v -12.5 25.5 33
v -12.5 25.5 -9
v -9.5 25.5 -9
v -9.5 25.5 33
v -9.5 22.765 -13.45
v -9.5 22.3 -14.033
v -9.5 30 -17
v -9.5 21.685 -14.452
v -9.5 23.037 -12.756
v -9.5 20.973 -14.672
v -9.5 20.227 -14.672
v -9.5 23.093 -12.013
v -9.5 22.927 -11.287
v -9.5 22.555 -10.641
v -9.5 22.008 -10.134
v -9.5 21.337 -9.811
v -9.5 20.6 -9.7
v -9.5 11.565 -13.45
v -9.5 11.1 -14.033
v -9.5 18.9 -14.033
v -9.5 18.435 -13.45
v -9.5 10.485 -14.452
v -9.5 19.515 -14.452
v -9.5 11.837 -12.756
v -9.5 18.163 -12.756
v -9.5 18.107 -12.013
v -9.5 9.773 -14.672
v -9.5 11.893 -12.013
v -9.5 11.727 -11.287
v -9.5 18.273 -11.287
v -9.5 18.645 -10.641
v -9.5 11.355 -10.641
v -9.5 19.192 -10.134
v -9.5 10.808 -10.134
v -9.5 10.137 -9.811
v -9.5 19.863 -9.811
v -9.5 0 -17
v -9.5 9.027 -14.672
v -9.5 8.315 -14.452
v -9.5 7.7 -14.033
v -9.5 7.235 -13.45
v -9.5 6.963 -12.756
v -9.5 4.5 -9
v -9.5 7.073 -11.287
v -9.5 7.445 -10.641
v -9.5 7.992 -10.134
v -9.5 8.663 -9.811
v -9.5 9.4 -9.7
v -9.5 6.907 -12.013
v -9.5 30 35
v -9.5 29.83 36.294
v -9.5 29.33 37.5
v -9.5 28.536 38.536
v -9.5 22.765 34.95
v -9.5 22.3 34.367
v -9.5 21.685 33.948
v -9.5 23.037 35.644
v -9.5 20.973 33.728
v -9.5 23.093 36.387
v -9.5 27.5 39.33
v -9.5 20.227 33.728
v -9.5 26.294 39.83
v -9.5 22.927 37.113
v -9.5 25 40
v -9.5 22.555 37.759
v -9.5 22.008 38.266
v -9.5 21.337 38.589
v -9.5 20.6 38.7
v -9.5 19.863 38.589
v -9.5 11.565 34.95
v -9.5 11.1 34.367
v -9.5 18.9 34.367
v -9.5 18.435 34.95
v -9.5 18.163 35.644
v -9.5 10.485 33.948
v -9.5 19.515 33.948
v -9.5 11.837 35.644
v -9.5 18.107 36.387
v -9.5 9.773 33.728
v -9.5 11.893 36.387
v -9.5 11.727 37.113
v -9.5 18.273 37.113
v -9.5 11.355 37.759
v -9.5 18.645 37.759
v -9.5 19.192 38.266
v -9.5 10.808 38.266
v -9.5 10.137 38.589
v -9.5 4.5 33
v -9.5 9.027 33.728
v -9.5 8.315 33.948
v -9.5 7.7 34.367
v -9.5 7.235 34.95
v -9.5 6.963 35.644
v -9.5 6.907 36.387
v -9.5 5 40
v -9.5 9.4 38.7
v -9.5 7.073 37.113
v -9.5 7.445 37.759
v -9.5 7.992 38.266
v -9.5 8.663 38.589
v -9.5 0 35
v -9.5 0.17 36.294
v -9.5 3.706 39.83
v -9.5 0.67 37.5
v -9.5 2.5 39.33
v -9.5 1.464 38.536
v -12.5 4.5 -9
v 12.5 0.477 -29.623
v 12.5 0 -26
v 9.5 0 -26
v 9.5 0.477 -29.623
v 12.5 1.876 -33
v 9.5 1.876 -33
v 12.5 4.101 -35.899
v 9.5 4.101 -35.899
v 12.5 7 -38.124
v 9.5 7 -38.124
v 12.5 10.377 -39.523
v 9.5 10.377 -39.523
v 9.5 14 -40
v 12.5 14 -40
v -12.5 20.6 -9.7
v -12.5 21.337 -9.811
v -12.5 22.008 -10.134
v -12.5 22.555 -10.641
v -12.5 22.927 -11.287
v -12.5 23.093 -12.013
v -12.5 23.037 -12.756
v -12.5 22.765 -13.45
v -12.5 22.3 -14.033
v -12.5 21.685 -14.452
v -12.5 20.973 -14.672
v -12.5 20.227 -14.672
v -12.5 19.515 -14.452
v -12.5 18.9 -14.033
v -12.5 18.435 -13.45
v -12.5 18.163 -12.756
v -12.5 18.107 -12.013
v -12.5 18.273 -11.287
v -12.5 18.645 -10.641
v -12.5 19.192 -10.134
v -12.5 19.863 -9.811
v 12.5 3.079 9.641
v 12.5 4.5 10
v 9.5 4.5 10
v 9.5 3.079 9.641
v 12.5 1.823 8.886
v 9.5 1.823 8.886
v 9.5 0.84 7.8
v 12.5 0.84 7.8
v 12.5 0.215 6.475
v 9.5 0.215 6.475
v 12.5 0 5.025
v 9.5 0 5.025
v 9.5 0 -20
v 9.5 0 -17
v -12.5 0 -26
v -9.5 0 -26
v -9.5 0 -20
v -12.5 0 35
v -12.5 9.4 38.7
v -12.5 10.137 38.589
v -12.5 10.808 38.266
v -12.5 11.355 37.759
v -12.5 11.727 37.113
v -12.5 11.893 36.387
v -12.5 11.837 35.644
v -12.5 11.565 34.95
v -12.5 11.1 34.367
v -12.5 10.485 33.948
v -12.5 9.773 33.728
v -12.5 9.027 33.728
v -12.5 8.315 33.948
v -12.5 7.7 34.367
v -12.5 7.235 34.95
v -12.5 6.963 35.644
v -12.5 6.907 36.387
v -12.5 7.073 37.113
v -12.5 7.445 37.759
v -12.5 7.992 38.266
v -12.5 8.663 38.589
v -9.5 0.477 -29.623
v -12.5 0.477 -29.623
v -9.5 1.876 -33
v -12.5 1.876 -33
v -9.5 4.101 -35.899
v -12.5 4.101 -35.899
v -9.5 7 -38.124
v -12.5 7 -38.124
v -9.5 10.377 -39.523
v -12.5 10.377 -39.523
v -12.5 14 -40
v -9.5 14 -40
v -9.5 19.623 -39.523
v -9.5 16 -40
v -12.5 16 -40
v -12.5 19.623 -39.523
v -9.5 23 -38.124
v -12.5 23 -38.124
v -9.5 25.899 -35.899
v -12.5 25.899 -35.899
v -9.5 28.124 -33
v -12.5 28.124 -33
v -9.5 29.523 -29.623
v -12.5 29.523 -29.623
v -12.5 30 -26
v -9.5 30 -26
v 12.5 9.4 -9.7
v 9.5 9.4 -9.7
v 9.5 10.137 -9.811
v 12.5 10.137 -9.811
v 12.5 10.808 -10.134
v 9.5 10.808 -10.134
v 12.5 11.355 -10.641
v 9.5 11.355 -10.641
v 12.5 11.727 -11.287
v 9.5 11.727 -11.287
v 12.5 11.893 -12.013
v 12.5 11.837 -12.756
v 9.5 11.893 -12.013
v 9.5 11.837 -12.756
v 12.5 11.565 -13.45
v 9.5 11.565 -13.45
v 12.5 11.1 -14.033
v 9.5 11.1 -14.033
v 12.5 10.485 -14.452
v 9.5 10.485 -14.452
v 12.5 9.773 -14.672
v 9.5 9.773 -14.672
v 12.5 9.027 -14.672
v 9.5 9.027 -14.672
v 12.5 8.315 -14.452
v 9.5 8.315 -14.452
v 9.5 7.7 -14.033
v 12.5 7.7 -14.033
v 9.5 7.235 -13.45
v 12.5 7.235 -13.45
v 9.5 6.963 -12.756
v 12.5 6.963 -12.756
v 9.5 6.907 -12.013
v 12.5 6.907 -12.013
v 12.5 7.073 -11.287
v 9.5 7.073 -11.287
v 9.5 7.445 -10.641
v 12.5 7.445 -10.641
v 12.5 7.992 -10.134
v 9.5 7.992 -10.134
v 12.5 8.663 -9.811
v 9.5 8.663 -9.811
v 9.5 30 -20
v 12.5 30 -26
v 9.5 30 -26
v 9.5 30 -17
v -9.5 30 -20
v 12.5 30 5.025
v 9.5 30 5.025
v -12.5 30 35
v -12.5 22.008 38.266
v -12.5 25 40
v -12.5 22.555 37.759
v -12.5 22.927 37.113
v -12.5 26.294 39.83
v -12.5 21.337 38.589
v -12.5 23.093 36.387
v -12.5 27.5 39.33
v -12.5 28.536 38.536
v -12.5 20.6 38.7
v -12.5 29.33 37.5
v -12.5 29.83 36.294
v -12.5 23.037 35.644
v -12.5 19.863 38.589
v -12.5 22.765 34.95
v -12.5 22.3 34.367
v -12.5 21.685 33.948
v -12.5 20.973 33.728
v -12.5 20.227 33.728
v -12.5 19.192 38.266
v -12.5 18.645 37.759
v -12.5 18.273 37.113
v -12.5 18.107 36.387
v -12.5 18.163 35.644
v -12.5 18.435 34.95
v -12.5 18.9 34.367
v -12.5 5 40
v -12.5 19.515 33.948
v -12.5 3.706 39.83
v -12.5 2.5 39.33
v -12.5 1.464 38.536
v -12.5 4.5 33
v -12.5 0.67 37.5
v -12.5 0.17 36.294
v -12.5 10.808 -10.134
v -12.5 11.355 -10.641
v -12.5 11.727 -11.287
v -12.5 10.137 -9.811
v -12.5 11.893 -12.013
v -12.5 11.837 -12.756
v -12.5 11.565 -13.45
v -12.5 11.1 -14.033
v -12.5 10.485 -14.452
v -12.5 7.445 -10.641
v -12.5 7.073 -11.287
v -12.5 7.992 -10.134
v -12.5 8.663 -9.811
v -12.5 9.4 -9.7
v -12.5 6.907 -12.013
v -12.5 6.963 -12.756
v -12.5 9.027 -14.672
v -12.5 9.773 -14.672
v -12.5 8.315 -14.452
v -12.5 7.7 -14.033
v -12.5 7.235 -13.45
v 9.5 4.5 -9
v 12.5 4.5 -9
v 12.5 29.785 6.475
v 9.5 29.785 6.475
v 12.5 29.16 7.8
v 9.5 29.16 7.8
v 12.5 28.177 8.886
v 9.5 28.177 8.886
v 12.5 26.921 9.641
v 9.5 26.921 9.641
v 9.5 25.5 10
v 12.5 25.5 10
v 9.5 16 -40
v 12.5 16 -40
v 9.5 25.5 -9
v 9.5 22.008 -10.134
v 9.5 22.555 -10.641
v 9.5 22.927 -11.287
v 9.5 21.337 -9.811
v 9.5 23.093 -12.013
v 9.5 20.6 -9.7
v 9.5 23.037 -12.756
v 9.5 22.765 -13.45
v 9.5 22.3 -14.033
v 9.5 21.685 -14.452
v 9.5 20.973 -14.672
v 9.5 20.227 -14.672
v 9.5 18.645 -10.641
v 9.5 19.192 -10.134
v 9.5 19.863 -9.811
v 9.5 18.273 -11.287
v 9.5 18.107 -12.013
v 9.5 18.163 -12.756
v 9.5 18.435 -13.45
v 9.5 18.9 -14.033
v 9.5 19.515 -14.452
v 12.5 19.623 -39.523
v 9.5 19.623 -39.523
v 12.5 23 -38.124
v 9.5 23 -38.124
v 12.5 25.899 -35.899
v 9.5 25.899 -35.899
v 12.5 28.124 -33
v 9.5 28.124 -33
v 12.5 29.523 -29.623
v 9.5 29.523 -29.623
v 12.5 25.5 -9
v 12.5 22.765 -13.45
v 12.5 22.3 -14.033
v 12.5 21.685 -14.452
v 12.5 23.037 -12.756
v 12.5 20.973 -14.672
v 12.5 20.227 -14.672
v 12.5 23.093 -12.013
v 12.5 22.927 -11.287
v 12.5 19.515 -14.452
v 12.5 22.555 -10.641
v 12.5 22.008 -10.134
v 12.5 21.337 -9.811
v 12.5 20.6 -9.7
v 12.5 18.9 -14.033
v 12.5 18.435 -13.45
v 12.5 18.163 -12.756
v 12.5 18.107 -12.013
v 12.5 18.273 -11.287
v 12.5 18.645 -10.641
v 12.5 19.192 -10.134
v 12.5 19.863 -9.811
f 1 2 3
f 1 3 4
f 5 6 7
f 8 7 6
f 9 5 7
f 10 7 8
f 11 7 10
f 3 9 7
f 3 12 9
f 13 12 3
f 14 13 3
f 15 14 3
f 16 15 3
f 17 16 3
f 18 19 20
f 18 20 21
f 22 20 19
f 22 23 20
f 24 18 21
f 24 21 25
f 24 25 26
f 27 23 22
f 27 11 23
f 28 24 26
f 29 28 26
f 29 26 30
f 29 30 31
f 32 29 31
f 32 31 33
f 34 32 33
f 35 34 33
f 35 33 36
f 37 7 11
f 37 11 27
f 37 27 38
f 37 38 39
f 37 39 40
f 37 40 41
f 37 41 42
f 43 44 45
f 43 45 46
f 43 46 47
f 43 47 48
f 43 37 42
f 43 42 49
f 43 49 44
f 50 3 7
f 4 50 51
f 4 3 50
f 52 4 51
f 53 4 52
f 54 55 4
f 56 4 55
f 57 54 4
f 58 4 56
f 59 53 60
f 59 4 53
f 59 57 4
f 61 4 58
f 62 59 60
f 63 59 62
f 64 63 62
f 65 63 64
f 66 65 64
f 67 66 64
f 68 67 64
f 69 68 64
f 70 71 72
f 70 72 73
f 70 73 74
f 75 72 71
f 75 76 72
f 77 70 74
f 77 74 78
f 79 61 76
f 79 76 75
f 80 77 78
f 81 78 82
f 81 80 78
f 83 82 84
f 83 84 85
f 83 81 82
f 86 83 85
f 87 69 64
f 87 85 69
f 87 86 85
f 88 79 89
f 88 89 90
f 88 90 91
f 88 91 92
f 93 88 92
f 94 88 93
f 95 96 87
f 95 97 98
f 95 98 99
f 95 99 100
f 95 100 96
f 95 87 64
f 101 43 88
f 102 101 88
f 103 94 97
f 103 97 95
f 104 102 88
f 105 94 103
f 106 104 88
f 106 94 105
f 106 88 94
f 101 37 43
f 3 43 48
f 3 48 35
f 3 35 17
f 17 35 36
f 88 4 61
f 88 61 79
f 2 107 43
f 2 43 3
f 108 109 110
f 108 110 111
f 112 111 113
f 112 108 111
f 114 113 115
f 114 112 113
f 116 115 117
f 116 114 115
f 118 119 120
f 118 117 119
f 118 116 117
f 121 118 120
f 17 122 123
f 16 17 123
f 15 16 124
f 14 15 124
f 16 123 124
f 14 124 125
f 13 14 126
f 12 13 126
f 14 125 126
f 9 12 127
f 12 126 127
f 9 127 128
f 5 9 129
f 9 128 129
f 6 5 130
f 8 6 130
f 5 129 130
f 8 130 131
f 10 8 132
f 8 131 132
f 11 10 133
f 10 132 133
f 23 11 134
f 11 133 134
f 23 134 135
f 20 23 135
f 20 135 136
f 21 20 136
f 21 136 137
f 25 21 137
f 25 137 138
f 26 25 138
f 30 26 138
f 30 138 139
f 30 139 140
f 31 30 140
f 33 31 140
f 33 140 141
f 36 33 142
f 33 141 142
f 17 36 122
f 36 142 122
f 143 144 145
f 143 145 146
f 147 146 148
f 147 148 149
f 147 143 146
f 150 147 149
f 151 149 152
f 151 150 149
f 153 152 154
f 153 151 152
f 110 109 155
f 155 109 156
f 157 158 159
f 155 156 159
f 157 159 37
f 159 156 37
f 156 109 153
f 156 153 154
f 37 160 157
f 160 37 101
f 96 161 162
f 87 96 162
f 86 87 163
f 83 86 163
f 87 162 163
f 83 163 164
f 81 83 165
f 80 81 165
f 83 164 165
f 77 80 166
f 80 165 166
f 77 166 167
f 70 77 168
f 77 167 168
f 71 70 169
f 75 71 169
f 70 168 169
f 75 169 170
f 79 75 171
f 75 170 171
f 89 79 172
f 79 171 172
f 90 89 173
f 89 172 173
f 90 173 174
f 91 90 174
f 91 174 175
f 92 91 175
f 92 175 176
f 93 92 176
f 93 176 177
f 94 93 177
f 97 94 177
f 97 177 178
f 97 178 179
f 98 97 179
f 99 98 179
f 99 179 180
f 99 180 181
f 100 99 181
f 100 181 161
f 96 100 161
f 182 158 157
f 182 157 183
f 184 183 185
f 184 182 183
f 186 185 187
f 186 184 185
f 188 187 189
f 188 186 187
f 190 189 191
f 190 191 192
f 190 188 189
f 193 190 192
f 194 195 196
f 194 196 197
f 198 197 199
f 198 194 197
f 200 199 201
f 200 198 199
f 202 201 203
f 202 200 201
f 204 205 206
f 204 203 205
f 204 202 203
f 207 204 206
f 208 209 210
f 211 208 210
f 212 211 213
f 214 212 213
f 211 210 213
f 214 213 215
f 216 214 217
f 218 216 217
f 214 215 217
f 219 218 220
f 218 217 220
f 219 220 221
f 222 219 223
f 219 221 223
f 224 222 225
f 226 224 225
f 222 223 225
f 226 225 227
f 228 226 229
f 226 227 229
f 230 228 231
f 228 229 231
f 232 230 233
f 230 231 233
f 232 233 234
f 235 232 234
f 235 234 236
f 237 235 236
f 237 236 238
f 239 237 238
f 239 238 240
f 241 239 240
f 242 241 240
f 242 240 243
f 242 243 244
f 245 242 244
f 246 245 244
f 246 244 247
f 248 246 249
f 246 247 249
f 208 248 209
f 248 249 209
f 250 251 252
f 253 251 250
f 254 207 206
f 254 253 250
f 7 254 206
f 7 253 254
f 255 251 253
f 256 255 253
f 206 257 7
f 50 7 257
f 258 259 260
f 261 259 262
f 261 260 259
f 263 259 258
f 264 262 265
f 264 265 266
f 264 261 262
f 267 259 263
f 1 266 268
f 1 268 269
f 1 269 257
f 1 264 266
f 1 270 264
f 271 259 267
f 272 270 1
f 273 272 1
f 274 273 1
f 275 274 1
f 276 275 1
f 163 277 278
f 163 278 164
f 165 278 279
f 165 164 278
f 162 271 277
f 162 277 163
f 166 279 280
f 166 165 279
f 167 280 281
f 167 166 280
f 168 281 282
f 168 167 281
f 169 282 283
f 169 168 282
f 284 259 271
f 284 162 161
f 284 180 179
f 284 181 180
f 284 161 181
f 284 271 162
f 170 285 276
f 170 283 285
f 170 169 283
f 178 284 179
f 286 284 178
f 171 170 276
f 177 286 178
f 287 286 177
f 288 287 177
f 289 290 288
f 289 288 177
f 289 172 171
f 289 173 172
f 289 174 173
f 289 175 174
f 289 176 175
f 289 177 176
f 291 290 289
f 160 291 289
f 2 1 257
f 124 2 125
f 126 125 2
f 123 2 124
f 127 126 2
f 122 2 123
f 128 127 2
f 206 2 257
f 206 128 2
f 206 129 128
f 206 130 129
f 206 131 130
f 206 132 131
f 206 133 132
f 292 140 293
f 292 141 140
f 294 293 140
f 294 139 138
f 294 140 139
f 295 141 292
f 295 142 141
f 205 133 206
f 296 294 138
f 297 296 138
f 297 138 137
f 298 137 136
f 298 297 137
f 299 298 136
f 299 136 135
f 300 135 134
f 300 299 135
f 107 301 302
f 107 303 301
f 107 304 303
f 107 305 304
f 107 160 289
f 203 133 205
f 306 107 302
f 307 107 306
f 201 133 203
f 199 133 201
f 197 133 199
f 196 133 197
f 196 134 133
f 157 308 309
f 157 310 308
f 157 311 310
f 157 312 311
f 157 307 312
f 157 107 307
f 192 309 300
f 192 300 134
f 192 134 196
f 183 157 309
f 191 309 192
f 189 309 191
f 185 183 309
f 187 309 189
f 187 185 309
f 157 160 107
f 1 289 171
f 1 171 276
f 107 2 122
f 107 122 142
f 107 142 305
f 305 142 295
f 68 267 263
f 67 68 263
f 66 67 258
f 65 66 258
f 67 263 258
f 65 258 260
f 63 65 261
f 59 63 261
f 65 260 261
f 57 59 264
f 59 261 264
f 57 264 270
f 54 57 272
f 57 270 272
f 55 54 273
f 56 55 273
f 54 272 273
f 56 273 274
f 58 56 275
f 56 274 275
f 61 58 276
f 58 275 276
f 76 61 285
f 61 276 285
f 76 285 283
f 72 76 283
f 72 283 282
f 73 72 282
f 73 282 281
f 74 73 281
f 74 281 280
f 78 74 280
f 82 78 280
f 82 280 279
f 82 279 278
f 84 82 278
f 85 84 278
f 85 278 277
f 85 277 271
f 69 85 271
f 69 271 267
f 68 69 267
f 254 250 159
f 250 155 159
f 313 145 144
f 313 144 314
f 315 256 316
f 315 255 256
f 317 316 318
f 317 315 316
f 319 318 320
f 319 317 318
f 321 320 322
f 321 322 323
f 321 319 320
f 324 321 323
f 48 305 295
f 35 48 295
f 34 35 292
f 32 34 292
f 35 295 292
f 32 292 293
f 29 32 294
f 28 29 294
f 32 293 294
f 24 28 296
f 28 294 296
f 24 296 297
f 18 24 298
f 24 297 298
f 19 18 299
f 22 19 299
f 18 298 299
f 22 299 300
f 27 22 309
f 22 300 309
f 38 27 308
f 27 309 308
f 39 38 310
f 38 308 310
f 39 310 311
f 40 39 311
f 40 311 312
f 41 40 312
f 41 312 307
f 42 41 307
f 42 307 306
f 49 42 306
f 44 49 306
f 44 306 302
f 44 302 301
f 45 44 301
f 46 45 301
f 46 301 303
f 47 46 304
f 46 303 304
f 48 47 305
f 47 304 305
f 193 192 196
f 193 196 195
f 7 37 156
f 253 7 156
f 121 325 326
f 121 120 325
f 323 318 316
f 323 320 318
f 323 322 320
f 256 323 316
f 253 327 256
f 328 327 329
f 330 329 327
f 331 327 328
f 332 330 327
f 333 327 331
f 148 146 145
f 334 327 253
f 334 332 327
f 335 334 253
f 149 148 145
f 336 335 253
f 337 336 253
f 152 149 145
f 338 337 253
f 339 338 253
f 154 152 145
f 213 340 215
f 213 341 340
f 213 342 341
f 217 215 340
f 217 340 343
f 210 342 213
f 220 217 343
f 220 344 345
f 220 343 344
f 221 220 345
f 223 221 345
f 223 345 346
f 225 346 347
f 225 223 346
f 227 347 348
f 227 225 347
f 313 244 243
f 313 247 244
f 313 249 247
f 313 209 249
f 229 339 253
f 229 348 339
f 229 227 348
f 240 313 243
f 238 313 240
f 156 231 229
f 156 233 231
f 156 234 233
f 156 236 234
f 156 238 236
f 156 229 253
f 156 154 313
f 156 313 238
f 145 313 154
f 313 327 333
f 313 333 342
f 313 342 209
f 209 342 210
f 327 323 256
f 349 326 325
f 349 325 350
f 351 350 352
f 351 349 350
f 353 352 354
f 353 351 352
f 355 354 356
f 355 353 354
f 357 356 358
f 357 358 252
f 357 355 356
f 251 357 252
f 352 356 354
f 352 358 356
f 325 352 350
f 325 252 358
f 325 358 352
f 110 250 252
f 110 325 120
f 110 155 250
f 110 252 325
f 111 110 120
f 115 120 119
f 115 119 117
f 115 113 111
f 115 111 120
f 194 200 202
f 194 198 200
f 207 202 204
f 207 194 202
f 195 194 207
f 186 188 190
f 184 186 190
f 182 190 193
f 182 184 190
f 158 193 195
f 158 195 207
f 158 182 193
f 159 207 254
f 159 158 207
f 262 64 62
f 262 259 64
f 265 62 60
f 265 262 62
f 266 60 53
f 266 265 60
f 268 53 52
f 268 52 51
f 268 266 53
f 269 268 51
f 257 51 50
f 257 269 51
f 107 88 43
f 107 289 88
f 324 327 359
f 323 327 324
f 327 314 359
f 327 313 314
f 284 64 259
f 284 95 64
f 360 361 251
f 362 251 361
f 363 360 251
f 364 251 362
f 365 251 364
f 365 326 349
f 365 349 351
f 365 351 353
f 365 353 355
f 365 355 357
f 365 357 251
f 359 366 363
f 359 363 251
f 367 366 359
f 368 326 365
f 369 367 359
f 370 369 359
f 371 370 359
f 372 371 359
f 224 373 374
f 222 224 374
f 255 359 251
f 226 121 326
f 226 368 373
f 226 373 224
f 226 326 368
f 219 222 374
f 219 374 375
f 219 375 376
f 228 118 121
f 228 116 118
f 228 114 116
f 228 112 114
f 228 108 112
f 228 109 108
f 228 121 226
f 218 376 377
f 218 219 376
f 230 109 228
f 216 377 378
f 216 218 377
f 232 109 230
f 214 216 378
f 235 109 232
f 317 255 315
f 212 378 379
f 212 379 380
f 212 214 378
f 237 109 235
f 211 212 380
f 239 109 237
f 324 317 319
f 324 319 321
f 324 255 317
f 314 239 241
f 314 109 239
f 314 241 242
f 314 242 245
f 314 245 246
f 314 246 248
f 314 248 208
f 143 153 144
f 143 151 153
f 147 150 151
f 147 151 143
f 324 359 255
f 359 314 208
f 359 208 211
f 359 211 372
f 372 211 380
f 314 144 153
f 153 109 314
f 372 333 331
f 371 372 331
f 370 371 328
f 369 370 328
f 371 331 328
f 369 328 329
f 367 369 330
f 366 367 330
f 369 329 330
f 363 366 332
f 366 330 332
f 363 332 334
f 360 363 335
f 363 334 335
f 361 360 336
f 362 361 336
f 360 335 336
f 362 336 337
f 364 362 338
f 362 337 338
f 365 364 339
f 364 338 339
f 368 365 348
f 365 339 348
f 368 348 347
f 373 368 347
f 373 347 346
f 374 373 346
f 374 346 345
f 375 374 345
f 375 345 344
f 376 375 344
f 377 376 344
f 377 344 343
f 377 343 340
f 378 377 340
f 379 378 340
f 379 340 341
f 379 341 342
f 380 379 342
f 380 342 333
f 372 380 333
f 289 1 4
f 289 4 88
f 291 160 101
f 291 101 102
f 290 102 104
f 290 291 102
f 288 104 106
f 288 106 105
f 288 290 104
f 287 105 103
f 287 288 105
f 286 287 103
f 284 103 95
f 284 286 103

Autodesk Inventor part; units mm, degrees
ref_plane "YZ Plane" through (0, 0, 0) normal (1, 0, 0) x (0, 1, 0)
ref_plane "XZ Plane" through (0, 0, 0) normal (0, 1, 0) x (-1, 0, 0)
ref_plane "XY Plane" through (0, 0, 0) normal (0, 0, 1) x (1, 0, 0)
sketch "Esquisse1" plane through (0, 0, 0) normal (0, 1, 0) x (-1, 0, 0)
  line L0 (-9.5, -40) -> (-12.5, -40)
  line L1 (-12.5, -40) -> (-12.5, 10)
  line L2 (-12.5, 10) -> (-9.5, 10)
  line L3 (-9.5, 10) -> (-9.5, -40)
  line L4 (9.5, 40) -> (12.5, 40)
  line L5 (12.5, 40) -> (12.5, -40)
  line L6 (12.5, -40) -> (9.5, -40)
  line L7 (9.5, -40) -> (9.5, 40)
  line L8 (-9.5, -20) -> (9.5, -20)
  line L9 (9.5, -20) -> (9.5, -17)
  line L10 (9.5, -17) -> (-9.5, -17)
  line L11 (-9.5, -17) -> (-9.5, -20)
  point P0 (0, 0)
  dimension "d0" = 3
  dimension "d1" = 3
  dimension "d2" = 3
  dimension "d4" = 25
  dimension "d5" = 80
  dimension "d6" = 40
  dimension "d7" = 12.5
  dimension "d11" = 57
  dimension "d12" = 30
extrude "Extrusion1" add sketch "Esquisse1" along normal blind 30
fillet "Congé1" radius 14 4 edges at (11, 30, -40) (-11, 30, -40) (11, 0, -40) (-11, 0, -40)
sketch "Esquisse2" plane through (-12.5, 0, 40) normal (-1, 0, 0) x (0, 0, 1)
  line L0 (0, 0) -> (0, 30) projected
  line L1 (-80, 14) -> (-80, 16) projected
  line L2 (-49, 25.5) -> (-7, 25.5)
  line L3 (-7, 25.5) -> (-7, 4.5)
  line L4 (-7, 4.5) -> (-49, 4.5)
  line L5 (-49, 4.5) -> (-49, 25.5)
  line L6 (0, 15) -> (-80, 15) construction
  line L7 (-7, 25.5) -> (0, 25.5) construction
  line L8 (0, 25.5) -> (0, 4.5) construction
  line L9 (0, 4.5) -> (-7, 4.5) construction
  line L10 (-7, 4.5) -> (-7, 25.5) construction
  line L11 (-49, 25.5) -> (-56, 25.5) construction
  line L12 (-56, 25.5) -> (-56, 4.5) construction
  line L13 (-56, 4.5) -> (-49, 4.5) construction
  line L14 (-49, 4.5) -> (-49, 25.5) construction
  circle A0 centre (-52.2, 20.6) radius 2.5
  circle A1 centre (-52.2, 9.4) radius 2.5
  circle A2 centre (-3.8, 9.4) radius 2.5
  circle A3 centre (-3.8, 20.6) radius 2.5
  point P0 (-40, 0)
  dimension "d16" = 21
  dimension "d17" = 10.5
  dimension "d18" = 7
  dimension "d19" = 42
  dimension "d20" = 7
  dimension "d21" = 7
  dimension "d22" = 5
  dimension "d23" = 4.9
  dimension "d24" = 3.8
  dimension "d25" = 5
  dimension "d26" = 5
  dimension "d27" = 5
  dimension "d28" = 3.8
  dimension "d29" = 4.9
  dimension "d30" = 3.8
  dimension "d31" = 4.9
  dimension "d32" = 3.8
  dimension "d33" = 4.9
extrude "Extrusion2" cut sketch "Esquisse2" against normal through all
fillet "Congé2" radius 5 1 edges at (-11, 0, 40)
fillet "Congé3" radius 5 1 edges at (-11, 30, 40)
fillet "Congé4" radius 5 1 edges at (11, 0, 10)
fillet "Congé5" radius 5 1 edges at (11, 30, 10)
equation "\"d6\" = 0.5 * d5"
equation "\"d7\" = 0.5 * d4"
equation "\"d17\" = 0.5 * d16"
equation "\"d21\" = d20"
equation "\"d25\" = d22"
equation "\"d26\" = d22"
equation "\"d27\" = d22"
equation "\"d28\" = d24"
equation "\"d29\" = d23"
equation "\"d30\" = d24"
equation "\"d31\" = d23"
equation "\"d32\" = d24"
equation "\"d33\" = d23"
properties part number "new_leg_2"
